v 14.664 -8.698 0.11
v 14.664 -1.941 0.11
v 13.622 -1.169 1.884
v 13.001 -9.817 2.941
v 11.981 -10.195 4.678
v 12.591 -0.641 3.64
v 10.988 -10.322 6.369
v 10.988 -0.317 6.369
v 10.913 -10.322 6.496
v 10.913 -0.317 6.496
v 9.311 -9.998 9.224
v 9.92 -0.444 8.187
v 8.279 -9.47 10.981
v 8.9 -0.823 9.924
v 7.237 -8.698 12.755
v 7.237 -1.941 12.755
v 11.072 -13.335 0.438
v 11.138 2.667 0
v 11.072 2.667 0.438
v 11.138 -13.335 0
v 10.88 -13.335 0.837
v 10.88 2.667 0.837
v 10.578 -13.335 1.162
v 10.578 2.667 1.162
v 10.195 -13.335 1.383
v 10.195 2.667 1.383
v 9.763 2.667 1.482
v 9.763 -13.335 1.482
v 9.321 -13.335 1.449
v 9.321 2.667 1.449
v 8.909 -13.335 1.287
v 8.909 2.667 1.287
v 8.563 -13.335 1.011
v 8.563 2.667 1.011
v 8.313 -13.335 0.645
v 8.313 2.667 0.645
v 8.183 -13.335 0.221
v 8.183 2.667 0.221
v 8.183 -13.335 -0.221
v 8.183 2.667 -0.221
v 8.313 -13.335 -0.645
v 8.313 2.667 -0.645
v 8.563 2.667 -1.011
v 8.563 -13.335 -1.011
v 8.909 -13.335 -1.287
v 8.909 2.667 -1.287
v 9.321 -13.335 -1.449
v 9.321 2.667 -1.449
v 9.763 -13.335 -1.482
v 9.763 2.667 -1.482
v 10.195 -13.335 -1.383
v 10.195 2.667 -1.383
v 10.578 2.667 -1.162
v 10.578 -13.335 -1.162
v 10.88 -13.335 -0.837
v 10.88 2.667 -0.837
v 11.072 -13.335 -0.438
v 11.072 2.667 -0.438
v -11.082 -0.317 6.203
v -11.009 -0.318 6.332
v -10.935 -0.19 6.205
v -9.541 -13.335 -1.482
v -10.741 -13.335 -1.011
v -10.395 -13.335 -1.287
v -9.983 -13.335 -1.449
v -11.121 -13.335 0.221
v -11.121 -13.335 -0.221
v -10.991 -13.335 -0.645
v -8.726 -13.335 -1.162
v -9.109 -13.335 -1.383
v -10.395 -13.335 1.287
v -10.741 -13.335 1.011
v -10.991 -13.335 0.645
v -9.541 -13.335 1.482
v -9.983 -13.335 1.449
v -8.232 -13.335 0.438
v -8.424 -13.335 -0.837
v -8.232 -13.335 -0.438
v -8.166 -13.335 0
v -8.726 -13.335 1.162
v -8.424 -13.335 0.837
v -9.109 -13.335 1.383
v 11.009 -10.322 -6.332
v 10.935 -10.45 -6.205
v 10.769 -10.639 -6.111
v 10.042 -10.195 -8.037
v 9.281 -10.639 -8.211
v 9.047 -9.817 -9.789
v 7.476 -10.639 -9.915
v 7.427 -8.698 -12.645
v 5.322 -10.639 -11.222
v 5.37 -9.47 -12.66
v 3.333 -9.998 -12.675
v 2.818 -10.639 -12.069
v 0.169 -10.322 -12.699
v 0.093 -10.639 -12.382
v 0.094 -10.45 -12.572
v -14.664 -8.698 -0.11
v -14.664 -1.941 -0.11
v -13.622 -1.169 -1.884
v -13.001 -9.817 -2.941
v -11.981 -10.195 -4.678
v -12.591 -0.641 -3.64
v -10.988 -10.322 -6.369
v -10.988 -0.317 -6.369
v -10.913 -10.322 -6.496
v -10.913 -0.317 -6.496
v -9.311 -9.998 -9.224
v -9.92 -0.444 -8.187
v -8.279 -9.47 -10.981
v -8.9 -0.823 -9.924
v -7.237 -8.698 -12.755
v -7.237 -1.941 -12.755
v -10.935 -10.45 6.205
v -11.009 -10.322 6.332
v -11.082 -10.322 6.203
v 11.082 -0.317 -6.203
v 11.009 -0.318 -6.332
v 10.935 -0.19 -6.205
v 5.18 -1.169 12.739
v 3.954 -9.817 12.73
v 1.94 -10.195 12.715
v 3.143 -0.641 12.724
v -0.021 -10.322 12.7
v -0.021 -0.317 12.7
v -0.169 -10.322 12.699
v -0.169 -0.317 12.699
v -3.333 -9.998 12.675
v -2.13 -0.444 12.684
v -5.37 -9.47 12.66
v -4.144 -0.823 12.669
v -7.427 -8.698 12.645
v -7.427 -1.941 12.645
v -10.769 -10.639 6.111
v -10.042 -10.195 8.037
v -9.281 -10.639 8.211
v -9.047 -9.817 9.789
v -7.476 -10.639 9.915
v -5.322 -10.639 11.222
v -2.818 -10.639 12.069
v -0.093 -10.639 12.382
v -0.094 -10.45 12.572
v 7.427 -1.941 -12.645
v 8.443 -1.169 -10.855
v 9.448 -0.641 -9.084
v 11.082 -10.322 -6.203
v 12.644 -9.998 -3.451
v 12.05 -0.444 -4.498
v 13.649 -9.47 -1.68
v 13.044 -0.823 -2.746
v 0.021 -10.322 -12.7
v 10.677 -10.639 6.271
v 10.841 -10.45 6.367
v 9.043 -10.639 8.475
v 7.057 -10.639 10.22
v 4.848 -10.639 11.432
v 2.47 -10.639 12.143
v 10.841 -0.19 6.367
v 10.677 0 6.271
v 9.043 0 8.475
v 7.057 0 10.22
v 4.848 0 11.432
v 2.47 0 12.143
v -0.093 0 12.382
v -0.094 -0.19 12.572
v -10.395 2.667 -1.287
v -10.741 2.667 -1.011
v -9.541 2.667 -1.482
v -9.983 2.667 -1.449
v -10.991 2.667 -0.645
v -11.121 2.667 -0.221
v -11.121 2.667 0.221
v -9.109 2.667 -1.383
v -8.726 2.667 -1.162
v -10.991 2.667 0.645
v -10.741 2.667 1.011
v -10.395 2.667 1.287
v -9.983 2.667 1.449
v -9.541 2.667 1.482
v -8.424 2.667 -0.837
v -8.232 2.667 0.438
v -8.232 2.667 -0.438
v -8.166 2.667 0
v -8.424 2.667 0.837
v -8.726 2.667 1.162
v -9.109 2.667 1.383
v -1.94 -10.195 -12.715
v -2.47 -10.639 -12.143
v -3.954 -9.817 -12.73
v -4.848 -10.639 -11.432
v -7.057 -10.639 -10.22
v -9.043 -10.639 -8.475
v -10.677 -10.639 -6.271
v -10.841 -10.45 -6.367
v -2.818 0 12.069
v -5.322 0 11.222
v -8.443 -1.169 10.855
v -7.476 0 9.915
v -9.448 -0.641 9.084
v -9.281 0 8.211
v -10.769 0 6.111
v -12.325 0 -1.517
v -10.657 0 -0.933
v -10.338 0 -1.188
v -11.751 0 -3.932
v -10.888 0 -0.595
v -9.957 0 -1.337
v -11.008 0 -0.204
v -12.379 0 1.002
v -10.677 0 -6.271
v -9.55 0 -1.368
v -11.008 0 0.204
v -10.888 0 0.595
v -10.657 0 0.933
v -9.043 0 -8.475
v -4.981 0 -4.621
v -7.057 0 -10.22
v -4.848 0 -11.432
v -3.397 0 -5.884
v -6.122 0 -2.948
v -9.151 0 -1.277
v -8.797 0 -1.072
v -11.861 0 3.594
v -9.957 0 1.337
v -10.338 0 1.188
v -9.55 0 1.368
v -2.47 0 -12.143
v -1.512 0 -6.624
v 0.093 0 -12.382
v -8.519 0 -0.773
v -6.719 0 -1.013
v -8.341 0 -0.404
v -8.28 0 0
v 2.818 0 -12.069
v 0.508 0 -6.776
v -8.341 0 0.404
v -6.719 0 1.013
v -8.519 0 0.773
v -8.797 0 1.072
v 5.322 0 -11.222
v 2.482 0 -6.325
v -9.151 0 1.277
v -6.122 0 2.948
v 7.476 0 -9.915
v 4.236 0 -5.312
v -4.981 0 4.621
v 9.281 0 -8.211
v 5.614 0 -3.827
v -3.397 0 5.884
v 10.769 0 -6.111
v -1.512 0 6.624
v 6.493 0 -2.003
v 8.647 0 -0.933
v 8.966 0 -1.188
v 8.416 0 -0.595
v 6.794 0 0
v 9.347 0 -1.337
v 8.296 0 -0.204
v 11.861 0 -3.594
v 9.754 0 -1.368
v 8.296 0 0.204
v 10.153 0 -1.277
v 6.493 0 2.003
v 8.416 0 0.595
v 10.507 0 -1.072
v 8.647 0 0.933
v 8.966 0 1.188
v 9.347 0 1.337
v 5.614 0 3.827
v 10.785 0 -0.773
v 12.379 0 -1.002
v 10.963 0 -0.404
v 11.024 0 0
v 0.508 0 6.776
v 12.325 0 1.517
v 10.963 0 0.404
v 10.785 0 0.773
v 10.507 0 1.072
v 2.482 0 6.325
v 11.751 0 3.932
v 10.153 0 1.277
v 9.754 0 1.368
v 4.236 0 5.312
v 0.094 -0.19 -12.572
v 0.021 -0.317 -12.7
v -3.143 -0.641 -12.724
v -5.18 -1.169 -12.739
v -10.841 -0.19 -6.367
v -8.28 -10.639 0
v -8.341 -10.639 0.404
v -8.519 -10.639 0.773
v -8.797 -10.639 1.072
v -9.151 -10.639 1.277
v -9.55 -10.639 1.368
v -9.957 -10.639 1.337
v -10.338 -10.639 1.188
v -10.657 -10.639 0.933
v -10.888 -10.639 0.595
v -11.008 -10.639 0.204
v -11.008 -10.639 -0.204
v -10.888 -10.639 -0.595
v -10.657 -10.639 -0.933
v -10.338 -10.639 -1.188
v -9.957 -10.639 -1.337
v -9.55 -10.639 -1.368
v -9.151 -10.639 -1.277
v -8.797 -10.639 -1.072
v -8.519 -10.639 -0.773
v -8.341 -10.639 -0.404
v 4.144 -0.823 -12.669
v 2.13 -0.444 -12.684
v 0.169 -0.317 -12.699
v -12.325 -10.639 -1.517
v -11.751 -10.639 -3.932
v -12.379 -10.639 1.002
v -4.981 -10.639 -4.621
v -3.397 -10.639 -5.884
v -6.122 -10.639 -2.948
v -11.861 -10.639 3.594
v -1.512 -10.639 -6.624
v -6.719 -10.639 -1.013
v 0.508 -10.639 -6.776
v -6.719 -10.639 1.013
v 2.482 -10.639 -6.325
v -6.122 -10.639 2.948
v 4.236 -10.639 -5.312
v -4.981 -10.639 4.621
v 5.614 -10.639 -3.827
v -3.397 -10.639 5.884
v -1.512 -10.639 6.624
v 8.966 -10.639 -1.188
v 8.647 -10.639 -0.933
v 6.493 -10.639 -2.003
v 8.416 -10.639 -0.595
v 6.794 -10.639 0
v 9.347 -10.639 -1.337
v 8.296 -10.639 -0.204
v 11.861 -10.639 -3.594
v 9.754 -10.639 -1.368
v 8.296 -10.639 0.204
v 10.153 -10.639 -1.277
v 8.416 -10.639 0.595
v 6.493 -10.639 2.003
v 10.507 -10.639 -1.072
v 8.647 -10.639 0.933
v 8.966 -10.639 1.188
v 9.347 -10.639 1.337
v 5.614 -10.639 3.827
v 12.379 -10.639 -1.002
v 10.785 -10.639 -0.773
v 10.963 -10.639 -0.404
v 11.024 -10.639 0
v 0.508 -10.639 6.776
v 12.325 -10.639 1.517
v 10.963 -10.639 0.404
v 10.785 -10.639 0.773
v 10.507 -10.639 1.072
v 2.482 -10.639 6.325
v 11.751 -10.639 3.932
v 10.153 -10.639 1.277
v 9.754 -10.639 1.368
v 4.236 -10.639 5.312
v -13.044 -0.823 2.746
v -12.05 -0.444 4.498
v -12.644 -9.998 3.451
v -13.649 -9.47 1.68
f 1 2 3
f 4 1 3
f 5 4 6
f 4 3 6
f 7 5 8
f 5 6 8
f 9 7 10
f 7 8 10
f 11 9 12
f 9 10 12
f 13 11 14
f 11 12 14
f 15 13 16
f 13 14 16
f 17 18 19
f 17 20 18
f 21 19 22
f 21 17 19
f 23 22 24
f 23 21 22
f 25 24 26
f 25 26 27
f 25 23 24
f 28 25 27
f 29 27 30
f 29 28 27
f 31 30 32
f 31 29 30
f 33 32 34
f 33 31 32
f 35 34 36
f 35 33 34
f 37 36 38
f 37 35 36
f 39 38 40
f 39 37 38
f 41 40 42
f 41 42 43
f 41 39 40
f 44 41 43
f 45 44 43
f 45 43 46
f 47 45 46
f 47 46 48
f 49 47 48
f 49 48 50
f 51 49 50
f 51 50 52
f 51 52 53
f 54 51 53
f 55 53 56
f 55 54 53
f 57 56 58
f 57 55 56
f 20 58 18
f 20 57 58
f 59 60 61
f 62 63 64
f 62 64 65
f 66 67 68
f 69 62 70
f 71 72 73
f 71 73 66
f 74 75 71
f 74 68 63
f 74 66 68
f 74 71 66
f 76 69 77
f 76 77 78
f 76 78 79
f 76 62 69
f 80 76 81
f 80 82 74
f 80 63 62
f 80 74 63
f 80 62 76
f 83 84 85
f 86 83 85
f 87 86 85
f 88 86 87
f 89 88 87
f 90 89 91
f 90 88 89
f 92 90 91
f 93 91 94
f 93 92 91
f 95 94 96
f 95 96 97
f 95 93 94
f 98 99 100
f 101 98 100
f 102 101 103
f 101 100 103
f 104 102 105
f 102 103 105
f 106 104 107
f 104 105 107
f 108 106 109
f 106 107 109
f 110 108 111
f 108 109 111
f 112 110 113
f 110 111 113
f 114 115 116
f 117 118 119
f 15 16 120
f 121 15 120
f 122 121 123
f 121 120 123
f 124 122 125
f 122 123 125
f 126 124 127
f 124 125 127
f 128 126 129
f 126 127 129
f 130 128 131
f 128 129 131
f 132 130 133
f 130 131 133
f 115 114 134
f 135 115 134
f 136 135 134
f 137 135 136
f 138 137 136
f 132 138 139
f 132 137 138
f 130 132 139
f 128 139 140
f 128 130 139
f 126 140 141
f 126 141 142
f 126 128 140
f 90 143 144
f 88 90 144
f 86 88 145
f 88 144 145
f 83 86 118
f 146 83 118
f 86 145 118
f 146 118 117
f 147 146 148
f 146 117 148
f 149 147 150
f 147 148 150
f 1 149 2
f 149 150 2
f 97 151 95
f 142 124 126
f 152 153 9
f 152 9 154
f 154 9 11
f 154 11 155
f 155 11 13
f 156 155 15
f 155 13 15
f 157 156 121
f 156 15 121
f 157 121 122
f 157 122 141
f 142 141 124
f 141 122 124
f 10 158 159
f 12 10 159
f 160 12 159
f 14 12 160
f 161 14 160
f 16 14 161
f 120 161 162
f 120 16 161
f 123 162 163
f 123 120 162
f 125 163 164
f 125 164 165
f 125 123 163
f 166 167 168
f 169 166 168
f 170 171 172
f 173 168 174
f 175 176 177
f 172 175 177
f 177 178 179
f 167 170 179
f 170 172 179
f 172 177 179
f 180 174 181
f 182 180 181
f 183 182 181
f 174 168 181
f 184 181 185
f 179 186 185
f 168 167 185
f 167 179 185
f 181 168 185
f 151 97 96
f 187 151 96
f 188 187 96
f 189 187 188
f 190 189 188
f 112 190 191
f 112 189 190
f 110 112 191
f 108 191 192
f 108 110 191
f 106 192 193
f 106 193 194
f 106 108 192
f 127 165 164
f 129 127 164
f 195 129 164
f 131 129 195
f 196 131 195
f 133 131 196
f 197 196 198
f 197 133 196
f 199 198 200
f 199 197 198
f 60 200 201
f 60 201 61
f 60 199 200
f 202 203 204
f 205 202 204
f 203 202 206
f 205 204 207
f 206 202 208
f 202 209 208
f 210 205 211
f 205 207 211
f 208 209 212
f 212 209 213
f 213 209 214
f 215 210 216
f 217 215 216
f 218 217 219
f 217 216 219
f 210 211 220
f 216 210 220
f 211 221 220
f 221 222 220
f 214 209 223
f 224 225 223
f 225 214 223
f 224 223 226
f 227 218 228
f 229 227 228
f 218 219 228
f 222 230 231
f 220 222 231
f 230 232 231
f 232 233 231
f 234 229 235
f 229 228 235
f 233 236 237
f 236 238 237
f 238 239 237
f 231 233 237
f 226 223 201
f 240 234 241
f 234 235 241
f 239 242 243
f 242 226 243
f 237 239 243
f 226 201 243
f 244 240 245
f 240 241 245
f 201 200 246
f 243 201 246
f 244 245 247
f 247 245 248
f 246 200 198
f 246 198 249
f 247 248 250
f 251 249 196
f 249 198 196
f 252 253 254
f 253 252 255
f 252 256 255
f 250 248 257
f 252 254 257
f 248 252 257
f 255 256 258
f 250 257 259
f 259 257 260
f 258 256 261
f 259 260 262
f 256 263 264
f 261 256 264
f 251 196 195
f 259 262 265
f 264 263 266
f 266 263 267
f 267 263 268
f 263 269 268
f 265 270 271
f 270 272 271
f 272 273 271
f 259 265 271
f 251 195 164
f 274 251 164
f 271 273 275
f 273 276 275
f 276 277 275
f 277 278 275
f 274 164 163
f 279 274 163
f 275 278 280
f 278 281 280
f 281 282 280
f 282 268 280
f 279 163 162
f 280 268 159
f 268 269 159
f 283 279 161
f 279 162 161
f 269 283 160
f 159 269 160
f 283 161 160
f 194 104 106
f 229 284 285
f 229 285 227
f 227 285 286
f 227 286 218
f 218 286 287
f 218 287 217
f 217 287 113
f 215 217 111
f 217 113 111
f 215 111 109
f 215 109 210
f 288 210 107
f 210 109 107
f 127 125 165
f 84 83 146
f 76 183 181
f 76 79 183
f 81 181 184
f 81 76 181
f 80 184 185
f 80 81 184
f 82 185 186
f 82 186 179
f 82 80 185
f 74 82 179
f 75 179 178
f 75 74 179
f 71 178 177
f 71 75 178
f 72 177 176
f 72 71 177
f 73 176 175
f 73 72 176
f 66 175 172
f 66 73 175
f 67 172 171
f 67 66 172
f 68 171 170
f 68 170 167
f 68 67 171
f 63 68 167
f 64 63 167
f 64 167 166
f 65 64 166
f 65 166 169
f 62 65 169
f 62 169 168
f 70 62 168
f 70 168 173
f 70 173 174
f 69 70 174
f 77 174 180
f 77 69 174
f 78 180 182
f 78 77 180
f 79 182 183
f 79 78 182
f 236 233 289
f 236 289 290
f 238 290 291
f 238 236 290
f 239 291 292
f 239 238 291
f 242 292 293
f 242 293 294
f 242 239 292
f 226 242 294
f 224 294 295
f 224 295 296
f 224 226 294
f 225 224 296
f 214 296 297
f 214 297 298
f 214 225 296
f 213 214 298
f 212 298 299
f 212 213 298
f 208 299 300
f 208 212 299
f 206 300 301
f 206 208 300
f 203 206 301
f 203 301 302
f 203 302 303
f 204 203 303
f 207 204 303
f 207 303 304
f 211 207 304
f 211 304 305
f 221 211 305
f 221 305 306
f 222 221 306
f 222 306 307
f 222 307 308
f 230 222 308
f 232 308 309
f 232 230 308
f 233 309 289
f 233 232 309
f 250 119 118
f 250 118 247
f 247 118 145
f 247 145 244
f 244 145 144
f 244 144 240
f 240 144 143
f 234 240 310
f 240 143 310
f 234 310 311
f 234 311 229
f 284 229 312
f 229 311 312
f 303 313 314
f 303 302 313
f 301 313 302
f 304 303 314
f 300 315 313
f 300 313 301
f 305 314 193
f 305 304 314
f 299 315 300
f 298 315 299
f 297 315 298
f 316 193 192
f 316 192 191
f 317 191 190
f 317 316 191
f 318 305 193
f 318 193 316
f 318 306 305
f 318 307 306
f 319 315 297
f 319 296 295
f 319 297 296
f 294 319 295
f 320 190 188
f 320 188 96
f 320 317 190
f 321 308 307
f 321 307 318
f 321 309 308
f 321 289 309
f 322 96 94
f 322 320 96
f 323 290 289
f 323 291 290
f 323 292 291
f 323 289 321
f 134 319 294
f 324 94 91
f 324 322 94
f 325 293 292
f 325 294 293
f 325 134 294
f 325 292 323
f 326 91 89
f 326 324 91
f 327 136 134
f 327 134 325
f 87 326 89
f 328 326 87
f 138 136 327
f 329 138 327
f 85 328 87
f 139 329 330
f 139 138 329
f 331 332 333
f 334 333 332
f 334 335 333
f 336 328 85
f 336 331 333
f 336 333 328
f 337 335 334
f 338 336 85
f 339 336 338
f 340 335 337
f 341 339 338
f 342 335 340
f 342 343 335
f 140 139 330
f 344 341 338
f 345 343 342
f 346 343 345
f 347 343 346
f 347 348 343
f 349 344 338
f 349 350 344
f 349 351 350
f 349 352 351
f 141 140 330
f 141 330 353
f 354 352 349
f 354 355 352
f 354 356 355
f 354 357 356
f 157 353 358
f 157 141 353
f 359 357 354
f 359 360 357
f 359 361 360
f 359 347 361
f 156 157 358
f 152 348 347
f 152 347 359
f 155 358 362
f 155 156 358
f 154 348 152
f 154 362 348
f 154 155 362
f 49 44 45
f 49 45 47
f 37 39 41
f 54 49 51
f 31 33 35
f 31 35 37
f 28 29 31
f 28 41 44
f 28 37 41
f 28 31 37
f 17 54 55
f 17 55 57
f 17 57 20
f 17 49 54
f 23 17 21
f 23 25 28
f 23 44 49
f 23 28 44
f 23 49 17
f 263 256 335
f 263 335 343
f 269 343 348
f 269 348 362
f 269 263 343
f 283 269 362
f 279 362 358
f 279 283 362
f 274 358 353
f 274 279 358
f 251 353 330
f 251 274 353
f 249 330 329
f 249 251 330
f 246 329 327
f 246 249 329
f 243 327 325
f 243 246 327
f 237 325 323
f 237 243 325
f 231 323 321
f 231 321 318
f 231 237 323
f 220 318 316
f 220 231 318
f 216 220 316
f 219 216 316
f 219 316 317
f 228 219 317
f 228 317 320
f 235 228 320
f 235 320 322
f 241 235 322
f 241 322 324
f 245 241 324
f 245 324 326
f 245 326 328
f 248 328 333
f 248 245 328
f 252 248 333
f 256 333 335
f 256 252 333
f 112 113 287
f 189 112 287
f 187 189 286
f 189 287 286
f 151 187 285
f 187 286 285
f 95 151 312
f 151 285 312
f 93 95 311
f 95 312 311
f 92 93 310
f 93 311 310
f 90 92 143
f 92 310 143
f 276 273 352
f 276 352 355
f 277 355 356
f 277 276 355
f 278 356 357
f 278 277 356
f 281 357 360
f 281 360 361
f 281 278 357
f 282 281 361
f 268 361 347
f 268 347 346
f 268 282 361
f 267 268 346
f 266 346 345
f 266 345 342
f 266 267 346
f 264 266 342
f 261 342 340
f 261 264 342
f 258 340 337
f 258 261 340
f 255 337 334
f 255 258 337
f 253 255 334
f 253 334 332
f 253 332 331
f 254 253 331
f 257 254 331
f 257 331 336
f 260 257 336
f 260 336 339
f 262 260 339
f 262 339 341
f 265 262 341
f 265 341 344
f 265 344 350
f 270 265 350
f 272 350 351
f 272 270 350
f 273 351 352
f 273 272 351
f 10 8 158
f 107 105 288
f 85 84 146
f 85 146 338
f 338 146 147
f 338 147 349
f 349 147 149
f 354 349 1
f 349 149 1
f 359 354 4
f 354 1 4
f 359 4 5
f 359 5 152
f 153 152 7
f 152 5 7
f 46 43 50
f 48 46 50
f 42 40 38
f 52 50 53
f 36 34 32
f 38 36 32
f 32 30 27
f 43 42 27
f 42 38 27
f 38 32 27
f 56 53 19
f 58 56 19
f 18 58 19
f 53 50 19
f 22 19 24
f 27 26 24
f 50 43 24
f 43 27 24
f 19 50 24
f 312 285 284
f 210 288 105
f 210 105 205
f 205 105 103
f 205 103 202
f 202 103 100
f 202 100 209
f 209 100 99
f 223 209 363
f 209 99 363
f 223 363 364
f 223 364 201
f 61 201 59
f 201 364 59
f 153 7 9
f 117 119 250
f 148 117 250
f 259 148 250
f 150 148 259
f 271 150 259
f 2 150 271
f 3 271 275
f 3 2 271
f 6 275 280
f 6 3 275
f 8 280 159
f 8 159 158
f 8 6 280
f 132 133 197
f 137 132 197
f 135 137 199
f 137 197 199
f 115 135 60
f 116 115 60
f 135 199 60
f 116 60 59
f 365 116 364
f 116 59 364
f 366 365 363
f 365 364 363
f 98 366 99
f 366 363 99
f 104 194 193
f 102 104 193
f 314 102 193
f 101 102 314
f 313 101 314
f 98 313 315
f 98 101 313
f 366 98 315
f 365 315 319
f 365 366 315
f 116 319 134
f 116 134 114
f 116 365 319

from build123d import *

# Parameters (mm, degrees)
F0_R          = 1.3716
F0_R_2        = 6.7945
F1_DEPTH      = 10.63938
F2_R          = 1.4859
F3_DEPTH      = 13.335
F3_DEPTH_BACK = 2.667
F4_SIZE2      = 0.3175
F4_SIZE       = 0.3175
F5_T1_DEPTH   = 34.0860309116
F5_T3_DEPTH   = 34.0860309116
F5_T5_DEPTH   = 34.0860309116
F5_T7_DEPTH   = 34.0860309116
F5_T9_DEPTH   = 34.0860309116
F5_T11_DEPTH  = 34.0860309116
F5_T13_DEPTH  = 34.0860309116
F5_T15_DEPTH  = 34.0860309116
F5_T17_DEPTH  = 34.0860309116
F5_T19_DEPTH  = 34.0860309116
F5_T21_DEPTH  = 34.0860309116
F5_T23_DEPTH  = 34.0860309116


# Not quite as in the source:
# - a fillet or chamfer that OpenCascade refuses, or shapes differently, is made with other operations: its cross-section is extruded or revolved along the edge and cut away or added


with BuildPart() as f1:
    # F0 (on Front) → F1 (new body)
    with BuildSketch(Plane.XZ):
        Polygon((7.427176254, -12.6447770335), (14.6642862631, 0.1097347976), (7.2371100092, 12.754511831), (-7.427176254, 12.6447770335), (-14.6642862631, -0.1097347976), (-7.2371100092, -12.754511831), align=None)
        with Locations((-9.652, 0)):
            Circle(F0_R, mode=Mode.SUBTRACT)
        Circle(F0_R_2, mode=Mode.SUBTRACT)
        with Locations((9.652, 0)):
            Circle(F0_R, mode=Mode.SUBTRACT)
    extrude(amount=F1_DEPTH)

    # F4
    f4_edges = [f1.edges().sort_by_distance(p)[0] for p in [
        (-11.045731, -10.63938, 6.267521),
        (-0.095033, -10.63938, 12.699644),
        (-10.950698, -10.63938, -6.432123),
        (0.095033, -10.63938, -12.699644),
        (11.045731, -10.63938, -6.267521),
        (10.950698, -10.63938, 6.432123),
        (-0.095033, 0, 12.699644),
        (10.950698, 0, 6.432123),
        (11.045731, 0, -6.267521),
        (0.095033, 0, -12.699644),
        (-10.950698, 0, -6.432123),
        (-11.045731, 0, 6.267521),
    ]]
    chamfer(f4_edges, length=F4_SIZE, length2=F4_SIZE2)

    # F5: fillet of radius 17.78 on 12 edges, made by hand

    # F5_s2 → F5_t1 (cut)
    with BuildSketch(Plane(origin=(21.2363539354, -18.3917369138, 0.158914451), x_dir=(-0.6546641443, -0.7559198755, 0), z_dir=(-0.7559077819, 0.6546536707, -0.0056565581))):
        with BuildLine():
            ThreePointArc((-7.0150486709, -6.2518889722), (-8.1325730637, 0.0398403383), (-6.9534591831, 6.3203187391))
            Line((-6.9534591831, 6.3203187391), (-9.3601778581, 0.0458542026))
            Line((-9.3601778581, 0.0458542026), (-7.0150486709, -6.2518889722))
        make_face()
    extrude(amount=F5_T1_DEPTH, mode=Mode.SUBTRACT)

    # F5_s4 → F5_t3 (cut)
    with BuildSketch(Plane(origin=(10.7558009193, -18.3917369138, -18.3117647664), x_dir=(-0.8632209447, -0.5048263073, 0), z_dir=(-0.382852614, 0.6546536707, 0.651807063))):
        with BuildLine():
            ThreePointArc((-9.343230333, -1.0005351171), (-5.4311798933, -6.0533145347), (0.0146355079, -9.3966381955))
            Line((0.0146355079, -9.3966381955), (-6.2510117502, -6.9670570718))
            Line((-6.2510117502, -6.9670570718), (-9.343230333, -1.0005351171))
        make_face()
    extrude(amount=F5_T3_DEPTH, mode=Mode.SUBTRACT)

    # F5_s6 → F5_t5 (cut)
    with BuildSketch(Plane(origin=(-10.4805530161, -18.3917369138, -18.4706792173), x_dir=(-0.8688328915, 0.49510545, 0), z_dir=(0.3730551679, 0.6546536707, 0.6574636211))):
        with BuildLine():
            ThreePointArc((-0.1757380658, -9.3950061047), (5.3265979335, -6.1455419894), (9.324702912, -1.1605770882))
            Line((9.324702912, -1.1605770882), (6.130643235, -7.0732061802))
            Line((6.130643235, -7.0732061802), (-0.1757380658, -9.3950061047))
        make_face()
    extrude(amount=F5_T5_DEPTH, mode=Mode.SUBTRACT)

    # F5_s8 → F5_t7 (cut)
    with BuildSketch(Plane(origin=(-21.2363539354, -18.3917369138, -0.158914451), x_dir=(-0.6546641443, 0.7559198755, 0), z_dir=(0.7559077819, 0.6546536707, 0.0056565581))):
        with BuildLine():
            ThreePointArc((6.9534591831, -6.3203187391), (8.1325730637, -0.0398403383), (7.0150486709, 6.2518889722))
            Line((7.0150486709, 6.2518889722), (9.3601778581, -0.0458542026))
            Line((9.3601778581, -0.0458542026), (6.9534591831, -6.3203187391))
        make_face()
    extrude(amount=F5_T7_DEPTH, mode=Mode.SUBTRACT)

    # F5_s10 → F5_t9 (cut)
    with BuildSketch(Plane(origin=(-10.7558009193, -18.3917369138, 18.3117647664), x_dir=(-0.8632209447, 0.5048263073, 0), z_dir=(0.382852614, 0.6546536707, -0.651807063))):
        with BuildLine():
            ThreePointArc((-0.0146355079, 9.3966381955), (5.4311798933, 6.0533145347), (9.343230333, 1.0005351171))
            Line((9.343230333, 1.0005351171), (6.2510117502, 6.9670570718))
            Line((6.2510117502, 6.9670570718), (-0.0146355079, 9.3966381955))
        make_face()
    extrude(amount=F5_T9_DEPTH, mode=Mode.SUBTRACT)

    # F5_s12 → F5_t11 (cut)
    with BuildSketch(Plane(origin=(10.4805530161, -18.3917369138, 18.4706792173), x_dir=(-0.8688328915, -0.49510545, 0), z_dir=(-0.3730551679, 0.6546536707, -0.6574636211))):
        with BuildLine():
            ThreePointArc((-9.324702912, 1.1605770882), (-5.3265979335, 6.1455419894), (0.1757380658, 9.3950061047))
            Line((0.1757380658, 9.3950061047), (-6.130643235, 7.0732061802))
            Line((-6.130643235, 7.0732061802), (-9.324702912, 1.1605770882))
        make_face()
    extrude(amount=F5_T11_DEPTH, mode=Mode.SUBTRACT)

    # F5_s14 → F5_t13 (cut)
    with BuildSketch(Plane(origin=(-15.9713737111, 13.8320026281, -0.1195159062), x_dir=(0.6546641443, 0.7559198755, 0), z_dir=(0.7559077819, -0.6546536707, 0.0056565581))):
        with BuildLine():
            ThreePointArc((-14.9959779879, -6.3597179142), (-16.1750918685, -0.0792395135), (-15.0575674756, 6.2124897971))
            Line((-15.0575674756, 6.2124897971), (-17.4026966628, -0.0852533777))
            Line((-17.4026966628, -0.0852533777), (-14.9959779879, -6.3597179142))
        make_face()
    extrude(amount=F5_T13_DEPTH, mode=Mode.SUBTRACT)

    # F5_s16 → F5_t15 (cut)
    with BuildSketch(Plane(origin=(-7.8821830446, 13.8320026281, -13.8913733202), x_dir=(0.8688328915, 0.49510545, 0), z_dir=(0.3730551679, -0.6546536707, 0.6574636211))):
        with BuildLine():
            ThreePointArc((-5.0918769572, -15.4724967867), (-10.5942129565, -12.2230326714), (-14.592317935, -7.2380677702))
            Line((-14.592317935, -7.2380677702), (-11.3982582579, -13.1506968622))
            Line((-11.3982582579, -13.1506968622), (-5.0918769572, -15.4724967867))
        make_face()
    extrude(amount=F5_T15_DEPTH, mode=Mode.SUBTRACT)

    # F5_s18 → F5_t17 (cut)
    with BuildSketch(Plane(origin=(-8.0891906664, 13.8320026281, 13.771857414), x_dir=(0.8632209447, 0.5048263073, 0), z_dir=(0.382852614, -0.6546536707, -0.651807063))):
        with BuildLine():
            ThreePointArc((-14.7142692504, 6.9868196047), (-10.8022188107, 12.0395990224), (-5.3564034095, 15.3829226832))
            Line((-5.3564034095, 15.3829226832), (-11.6220506676, 12.9533415595))
            Line((-11.6220506676, 12.9533415595), (-14.7142692504, 6.9868196047))
        make_face()
    extrude(amount=F5_T17_DEPTH, mode=Mode.SUBTRACT)

    # F5_s20 → F5_t19 (cut)
    with BuildSketch(Plane(origin=(7.8821830446, 13.8320026281, 13.8913733202), x_dir=(0.8688328915, -0.49510545, 0), z_dir=(-0.3730551679, -0.6546536707, -0.6574636211))):
        with BuildLine():
            ThreePointArc((14.592317935, 7.2380677702), (10.5942129565, 12.2230326714), (5.0918769572, 15.4724967867))
            Line((5.0918769572, 15.4724967867), (11.3982582579, 13.1506968622))
            Line((11.3982582579, 13.1506968622), (14.592317935, 7.2380677702))
        make_face()
    extrude(amount=F5_T19_DEPTH, mode=Mode.SUBTRACT)

    # F5_s22 → F5_t21 (cut)
    with BuildSketch(Plane(origin=(15.9713737111, 13.8320026281, 0.1195159062), x_dir=(0.6546641443, -0.7559198755, 0), z_dir=(-0.7559077819, -0.6546536707, -0.0056565581))):
        with BuildLine():
            ThreePointArc((15.0575674756, -6.2124897971), (16.1750918685, 0.0792395135), (14.9959779879, 6.3597179142))
            Line((14.9959779879, 6.3597179142), (17.4026966628, 0.0852533777))
            Line((17.4026966628, 0.0852533777), (15.0575674756, -6.2124897971))
        make_face()
    extrude(amount=F5_T21_DEPTH, mode=Mode.SUBTRACT)

    # F5_s24 → F5_t23 (cut)
    with BuildSketch(Plane(origin=(8.0891906664, 13.8320026281, -13.771857414), x_dir=(0.8632209447, -0.5048263073, 0), z_dir=(-0.382852614, -0.6546536707, 0.651807063))):
        with BuildLine():
            ThreePointArc((14.7142692504, -6.9868196047), (10.8022188107, -12.0395990224), (5.3564034095, -15.3829226832))
            Line((5.3564034095, -15.3829226832), (11.6220506676, -12.9533415595))
            Line((11.6220506676, -12.9533415595), (14.7142692504, -6.9868196047))
        make_face()
    extrude(amount=F5_T23_DEPTH, mode=Mode.SUBTRACT)


with BuildPart() as f3:
    # F2 (on Front) → F3 (new body, two sides)
    with BuildSketch(Plane.XZ) as f3_sk:
        with Locations((9.652, 0)):
            Circle(F2_R)
    extrude(amount=F3_DEPTH)
    extrude(f3_sk.sketch, amount=-F3_DEPTH_BACK)


with BuildPart() as f3b:
    # F2 (on Front) → F3, piece 2 (new body, two sides)
    with BuildSketch(Plane.XZ) as f3_2_sk:
        with Locations((-9.652, 0)):
            Circle(F2_R)
    extrude(amount=F3_DEPTH)
    extrude(f3_2_sk.sketch, amount=-F3_DEPTH_BACK)


solid = Compound([f1.part, f3.part, f3b.part])
